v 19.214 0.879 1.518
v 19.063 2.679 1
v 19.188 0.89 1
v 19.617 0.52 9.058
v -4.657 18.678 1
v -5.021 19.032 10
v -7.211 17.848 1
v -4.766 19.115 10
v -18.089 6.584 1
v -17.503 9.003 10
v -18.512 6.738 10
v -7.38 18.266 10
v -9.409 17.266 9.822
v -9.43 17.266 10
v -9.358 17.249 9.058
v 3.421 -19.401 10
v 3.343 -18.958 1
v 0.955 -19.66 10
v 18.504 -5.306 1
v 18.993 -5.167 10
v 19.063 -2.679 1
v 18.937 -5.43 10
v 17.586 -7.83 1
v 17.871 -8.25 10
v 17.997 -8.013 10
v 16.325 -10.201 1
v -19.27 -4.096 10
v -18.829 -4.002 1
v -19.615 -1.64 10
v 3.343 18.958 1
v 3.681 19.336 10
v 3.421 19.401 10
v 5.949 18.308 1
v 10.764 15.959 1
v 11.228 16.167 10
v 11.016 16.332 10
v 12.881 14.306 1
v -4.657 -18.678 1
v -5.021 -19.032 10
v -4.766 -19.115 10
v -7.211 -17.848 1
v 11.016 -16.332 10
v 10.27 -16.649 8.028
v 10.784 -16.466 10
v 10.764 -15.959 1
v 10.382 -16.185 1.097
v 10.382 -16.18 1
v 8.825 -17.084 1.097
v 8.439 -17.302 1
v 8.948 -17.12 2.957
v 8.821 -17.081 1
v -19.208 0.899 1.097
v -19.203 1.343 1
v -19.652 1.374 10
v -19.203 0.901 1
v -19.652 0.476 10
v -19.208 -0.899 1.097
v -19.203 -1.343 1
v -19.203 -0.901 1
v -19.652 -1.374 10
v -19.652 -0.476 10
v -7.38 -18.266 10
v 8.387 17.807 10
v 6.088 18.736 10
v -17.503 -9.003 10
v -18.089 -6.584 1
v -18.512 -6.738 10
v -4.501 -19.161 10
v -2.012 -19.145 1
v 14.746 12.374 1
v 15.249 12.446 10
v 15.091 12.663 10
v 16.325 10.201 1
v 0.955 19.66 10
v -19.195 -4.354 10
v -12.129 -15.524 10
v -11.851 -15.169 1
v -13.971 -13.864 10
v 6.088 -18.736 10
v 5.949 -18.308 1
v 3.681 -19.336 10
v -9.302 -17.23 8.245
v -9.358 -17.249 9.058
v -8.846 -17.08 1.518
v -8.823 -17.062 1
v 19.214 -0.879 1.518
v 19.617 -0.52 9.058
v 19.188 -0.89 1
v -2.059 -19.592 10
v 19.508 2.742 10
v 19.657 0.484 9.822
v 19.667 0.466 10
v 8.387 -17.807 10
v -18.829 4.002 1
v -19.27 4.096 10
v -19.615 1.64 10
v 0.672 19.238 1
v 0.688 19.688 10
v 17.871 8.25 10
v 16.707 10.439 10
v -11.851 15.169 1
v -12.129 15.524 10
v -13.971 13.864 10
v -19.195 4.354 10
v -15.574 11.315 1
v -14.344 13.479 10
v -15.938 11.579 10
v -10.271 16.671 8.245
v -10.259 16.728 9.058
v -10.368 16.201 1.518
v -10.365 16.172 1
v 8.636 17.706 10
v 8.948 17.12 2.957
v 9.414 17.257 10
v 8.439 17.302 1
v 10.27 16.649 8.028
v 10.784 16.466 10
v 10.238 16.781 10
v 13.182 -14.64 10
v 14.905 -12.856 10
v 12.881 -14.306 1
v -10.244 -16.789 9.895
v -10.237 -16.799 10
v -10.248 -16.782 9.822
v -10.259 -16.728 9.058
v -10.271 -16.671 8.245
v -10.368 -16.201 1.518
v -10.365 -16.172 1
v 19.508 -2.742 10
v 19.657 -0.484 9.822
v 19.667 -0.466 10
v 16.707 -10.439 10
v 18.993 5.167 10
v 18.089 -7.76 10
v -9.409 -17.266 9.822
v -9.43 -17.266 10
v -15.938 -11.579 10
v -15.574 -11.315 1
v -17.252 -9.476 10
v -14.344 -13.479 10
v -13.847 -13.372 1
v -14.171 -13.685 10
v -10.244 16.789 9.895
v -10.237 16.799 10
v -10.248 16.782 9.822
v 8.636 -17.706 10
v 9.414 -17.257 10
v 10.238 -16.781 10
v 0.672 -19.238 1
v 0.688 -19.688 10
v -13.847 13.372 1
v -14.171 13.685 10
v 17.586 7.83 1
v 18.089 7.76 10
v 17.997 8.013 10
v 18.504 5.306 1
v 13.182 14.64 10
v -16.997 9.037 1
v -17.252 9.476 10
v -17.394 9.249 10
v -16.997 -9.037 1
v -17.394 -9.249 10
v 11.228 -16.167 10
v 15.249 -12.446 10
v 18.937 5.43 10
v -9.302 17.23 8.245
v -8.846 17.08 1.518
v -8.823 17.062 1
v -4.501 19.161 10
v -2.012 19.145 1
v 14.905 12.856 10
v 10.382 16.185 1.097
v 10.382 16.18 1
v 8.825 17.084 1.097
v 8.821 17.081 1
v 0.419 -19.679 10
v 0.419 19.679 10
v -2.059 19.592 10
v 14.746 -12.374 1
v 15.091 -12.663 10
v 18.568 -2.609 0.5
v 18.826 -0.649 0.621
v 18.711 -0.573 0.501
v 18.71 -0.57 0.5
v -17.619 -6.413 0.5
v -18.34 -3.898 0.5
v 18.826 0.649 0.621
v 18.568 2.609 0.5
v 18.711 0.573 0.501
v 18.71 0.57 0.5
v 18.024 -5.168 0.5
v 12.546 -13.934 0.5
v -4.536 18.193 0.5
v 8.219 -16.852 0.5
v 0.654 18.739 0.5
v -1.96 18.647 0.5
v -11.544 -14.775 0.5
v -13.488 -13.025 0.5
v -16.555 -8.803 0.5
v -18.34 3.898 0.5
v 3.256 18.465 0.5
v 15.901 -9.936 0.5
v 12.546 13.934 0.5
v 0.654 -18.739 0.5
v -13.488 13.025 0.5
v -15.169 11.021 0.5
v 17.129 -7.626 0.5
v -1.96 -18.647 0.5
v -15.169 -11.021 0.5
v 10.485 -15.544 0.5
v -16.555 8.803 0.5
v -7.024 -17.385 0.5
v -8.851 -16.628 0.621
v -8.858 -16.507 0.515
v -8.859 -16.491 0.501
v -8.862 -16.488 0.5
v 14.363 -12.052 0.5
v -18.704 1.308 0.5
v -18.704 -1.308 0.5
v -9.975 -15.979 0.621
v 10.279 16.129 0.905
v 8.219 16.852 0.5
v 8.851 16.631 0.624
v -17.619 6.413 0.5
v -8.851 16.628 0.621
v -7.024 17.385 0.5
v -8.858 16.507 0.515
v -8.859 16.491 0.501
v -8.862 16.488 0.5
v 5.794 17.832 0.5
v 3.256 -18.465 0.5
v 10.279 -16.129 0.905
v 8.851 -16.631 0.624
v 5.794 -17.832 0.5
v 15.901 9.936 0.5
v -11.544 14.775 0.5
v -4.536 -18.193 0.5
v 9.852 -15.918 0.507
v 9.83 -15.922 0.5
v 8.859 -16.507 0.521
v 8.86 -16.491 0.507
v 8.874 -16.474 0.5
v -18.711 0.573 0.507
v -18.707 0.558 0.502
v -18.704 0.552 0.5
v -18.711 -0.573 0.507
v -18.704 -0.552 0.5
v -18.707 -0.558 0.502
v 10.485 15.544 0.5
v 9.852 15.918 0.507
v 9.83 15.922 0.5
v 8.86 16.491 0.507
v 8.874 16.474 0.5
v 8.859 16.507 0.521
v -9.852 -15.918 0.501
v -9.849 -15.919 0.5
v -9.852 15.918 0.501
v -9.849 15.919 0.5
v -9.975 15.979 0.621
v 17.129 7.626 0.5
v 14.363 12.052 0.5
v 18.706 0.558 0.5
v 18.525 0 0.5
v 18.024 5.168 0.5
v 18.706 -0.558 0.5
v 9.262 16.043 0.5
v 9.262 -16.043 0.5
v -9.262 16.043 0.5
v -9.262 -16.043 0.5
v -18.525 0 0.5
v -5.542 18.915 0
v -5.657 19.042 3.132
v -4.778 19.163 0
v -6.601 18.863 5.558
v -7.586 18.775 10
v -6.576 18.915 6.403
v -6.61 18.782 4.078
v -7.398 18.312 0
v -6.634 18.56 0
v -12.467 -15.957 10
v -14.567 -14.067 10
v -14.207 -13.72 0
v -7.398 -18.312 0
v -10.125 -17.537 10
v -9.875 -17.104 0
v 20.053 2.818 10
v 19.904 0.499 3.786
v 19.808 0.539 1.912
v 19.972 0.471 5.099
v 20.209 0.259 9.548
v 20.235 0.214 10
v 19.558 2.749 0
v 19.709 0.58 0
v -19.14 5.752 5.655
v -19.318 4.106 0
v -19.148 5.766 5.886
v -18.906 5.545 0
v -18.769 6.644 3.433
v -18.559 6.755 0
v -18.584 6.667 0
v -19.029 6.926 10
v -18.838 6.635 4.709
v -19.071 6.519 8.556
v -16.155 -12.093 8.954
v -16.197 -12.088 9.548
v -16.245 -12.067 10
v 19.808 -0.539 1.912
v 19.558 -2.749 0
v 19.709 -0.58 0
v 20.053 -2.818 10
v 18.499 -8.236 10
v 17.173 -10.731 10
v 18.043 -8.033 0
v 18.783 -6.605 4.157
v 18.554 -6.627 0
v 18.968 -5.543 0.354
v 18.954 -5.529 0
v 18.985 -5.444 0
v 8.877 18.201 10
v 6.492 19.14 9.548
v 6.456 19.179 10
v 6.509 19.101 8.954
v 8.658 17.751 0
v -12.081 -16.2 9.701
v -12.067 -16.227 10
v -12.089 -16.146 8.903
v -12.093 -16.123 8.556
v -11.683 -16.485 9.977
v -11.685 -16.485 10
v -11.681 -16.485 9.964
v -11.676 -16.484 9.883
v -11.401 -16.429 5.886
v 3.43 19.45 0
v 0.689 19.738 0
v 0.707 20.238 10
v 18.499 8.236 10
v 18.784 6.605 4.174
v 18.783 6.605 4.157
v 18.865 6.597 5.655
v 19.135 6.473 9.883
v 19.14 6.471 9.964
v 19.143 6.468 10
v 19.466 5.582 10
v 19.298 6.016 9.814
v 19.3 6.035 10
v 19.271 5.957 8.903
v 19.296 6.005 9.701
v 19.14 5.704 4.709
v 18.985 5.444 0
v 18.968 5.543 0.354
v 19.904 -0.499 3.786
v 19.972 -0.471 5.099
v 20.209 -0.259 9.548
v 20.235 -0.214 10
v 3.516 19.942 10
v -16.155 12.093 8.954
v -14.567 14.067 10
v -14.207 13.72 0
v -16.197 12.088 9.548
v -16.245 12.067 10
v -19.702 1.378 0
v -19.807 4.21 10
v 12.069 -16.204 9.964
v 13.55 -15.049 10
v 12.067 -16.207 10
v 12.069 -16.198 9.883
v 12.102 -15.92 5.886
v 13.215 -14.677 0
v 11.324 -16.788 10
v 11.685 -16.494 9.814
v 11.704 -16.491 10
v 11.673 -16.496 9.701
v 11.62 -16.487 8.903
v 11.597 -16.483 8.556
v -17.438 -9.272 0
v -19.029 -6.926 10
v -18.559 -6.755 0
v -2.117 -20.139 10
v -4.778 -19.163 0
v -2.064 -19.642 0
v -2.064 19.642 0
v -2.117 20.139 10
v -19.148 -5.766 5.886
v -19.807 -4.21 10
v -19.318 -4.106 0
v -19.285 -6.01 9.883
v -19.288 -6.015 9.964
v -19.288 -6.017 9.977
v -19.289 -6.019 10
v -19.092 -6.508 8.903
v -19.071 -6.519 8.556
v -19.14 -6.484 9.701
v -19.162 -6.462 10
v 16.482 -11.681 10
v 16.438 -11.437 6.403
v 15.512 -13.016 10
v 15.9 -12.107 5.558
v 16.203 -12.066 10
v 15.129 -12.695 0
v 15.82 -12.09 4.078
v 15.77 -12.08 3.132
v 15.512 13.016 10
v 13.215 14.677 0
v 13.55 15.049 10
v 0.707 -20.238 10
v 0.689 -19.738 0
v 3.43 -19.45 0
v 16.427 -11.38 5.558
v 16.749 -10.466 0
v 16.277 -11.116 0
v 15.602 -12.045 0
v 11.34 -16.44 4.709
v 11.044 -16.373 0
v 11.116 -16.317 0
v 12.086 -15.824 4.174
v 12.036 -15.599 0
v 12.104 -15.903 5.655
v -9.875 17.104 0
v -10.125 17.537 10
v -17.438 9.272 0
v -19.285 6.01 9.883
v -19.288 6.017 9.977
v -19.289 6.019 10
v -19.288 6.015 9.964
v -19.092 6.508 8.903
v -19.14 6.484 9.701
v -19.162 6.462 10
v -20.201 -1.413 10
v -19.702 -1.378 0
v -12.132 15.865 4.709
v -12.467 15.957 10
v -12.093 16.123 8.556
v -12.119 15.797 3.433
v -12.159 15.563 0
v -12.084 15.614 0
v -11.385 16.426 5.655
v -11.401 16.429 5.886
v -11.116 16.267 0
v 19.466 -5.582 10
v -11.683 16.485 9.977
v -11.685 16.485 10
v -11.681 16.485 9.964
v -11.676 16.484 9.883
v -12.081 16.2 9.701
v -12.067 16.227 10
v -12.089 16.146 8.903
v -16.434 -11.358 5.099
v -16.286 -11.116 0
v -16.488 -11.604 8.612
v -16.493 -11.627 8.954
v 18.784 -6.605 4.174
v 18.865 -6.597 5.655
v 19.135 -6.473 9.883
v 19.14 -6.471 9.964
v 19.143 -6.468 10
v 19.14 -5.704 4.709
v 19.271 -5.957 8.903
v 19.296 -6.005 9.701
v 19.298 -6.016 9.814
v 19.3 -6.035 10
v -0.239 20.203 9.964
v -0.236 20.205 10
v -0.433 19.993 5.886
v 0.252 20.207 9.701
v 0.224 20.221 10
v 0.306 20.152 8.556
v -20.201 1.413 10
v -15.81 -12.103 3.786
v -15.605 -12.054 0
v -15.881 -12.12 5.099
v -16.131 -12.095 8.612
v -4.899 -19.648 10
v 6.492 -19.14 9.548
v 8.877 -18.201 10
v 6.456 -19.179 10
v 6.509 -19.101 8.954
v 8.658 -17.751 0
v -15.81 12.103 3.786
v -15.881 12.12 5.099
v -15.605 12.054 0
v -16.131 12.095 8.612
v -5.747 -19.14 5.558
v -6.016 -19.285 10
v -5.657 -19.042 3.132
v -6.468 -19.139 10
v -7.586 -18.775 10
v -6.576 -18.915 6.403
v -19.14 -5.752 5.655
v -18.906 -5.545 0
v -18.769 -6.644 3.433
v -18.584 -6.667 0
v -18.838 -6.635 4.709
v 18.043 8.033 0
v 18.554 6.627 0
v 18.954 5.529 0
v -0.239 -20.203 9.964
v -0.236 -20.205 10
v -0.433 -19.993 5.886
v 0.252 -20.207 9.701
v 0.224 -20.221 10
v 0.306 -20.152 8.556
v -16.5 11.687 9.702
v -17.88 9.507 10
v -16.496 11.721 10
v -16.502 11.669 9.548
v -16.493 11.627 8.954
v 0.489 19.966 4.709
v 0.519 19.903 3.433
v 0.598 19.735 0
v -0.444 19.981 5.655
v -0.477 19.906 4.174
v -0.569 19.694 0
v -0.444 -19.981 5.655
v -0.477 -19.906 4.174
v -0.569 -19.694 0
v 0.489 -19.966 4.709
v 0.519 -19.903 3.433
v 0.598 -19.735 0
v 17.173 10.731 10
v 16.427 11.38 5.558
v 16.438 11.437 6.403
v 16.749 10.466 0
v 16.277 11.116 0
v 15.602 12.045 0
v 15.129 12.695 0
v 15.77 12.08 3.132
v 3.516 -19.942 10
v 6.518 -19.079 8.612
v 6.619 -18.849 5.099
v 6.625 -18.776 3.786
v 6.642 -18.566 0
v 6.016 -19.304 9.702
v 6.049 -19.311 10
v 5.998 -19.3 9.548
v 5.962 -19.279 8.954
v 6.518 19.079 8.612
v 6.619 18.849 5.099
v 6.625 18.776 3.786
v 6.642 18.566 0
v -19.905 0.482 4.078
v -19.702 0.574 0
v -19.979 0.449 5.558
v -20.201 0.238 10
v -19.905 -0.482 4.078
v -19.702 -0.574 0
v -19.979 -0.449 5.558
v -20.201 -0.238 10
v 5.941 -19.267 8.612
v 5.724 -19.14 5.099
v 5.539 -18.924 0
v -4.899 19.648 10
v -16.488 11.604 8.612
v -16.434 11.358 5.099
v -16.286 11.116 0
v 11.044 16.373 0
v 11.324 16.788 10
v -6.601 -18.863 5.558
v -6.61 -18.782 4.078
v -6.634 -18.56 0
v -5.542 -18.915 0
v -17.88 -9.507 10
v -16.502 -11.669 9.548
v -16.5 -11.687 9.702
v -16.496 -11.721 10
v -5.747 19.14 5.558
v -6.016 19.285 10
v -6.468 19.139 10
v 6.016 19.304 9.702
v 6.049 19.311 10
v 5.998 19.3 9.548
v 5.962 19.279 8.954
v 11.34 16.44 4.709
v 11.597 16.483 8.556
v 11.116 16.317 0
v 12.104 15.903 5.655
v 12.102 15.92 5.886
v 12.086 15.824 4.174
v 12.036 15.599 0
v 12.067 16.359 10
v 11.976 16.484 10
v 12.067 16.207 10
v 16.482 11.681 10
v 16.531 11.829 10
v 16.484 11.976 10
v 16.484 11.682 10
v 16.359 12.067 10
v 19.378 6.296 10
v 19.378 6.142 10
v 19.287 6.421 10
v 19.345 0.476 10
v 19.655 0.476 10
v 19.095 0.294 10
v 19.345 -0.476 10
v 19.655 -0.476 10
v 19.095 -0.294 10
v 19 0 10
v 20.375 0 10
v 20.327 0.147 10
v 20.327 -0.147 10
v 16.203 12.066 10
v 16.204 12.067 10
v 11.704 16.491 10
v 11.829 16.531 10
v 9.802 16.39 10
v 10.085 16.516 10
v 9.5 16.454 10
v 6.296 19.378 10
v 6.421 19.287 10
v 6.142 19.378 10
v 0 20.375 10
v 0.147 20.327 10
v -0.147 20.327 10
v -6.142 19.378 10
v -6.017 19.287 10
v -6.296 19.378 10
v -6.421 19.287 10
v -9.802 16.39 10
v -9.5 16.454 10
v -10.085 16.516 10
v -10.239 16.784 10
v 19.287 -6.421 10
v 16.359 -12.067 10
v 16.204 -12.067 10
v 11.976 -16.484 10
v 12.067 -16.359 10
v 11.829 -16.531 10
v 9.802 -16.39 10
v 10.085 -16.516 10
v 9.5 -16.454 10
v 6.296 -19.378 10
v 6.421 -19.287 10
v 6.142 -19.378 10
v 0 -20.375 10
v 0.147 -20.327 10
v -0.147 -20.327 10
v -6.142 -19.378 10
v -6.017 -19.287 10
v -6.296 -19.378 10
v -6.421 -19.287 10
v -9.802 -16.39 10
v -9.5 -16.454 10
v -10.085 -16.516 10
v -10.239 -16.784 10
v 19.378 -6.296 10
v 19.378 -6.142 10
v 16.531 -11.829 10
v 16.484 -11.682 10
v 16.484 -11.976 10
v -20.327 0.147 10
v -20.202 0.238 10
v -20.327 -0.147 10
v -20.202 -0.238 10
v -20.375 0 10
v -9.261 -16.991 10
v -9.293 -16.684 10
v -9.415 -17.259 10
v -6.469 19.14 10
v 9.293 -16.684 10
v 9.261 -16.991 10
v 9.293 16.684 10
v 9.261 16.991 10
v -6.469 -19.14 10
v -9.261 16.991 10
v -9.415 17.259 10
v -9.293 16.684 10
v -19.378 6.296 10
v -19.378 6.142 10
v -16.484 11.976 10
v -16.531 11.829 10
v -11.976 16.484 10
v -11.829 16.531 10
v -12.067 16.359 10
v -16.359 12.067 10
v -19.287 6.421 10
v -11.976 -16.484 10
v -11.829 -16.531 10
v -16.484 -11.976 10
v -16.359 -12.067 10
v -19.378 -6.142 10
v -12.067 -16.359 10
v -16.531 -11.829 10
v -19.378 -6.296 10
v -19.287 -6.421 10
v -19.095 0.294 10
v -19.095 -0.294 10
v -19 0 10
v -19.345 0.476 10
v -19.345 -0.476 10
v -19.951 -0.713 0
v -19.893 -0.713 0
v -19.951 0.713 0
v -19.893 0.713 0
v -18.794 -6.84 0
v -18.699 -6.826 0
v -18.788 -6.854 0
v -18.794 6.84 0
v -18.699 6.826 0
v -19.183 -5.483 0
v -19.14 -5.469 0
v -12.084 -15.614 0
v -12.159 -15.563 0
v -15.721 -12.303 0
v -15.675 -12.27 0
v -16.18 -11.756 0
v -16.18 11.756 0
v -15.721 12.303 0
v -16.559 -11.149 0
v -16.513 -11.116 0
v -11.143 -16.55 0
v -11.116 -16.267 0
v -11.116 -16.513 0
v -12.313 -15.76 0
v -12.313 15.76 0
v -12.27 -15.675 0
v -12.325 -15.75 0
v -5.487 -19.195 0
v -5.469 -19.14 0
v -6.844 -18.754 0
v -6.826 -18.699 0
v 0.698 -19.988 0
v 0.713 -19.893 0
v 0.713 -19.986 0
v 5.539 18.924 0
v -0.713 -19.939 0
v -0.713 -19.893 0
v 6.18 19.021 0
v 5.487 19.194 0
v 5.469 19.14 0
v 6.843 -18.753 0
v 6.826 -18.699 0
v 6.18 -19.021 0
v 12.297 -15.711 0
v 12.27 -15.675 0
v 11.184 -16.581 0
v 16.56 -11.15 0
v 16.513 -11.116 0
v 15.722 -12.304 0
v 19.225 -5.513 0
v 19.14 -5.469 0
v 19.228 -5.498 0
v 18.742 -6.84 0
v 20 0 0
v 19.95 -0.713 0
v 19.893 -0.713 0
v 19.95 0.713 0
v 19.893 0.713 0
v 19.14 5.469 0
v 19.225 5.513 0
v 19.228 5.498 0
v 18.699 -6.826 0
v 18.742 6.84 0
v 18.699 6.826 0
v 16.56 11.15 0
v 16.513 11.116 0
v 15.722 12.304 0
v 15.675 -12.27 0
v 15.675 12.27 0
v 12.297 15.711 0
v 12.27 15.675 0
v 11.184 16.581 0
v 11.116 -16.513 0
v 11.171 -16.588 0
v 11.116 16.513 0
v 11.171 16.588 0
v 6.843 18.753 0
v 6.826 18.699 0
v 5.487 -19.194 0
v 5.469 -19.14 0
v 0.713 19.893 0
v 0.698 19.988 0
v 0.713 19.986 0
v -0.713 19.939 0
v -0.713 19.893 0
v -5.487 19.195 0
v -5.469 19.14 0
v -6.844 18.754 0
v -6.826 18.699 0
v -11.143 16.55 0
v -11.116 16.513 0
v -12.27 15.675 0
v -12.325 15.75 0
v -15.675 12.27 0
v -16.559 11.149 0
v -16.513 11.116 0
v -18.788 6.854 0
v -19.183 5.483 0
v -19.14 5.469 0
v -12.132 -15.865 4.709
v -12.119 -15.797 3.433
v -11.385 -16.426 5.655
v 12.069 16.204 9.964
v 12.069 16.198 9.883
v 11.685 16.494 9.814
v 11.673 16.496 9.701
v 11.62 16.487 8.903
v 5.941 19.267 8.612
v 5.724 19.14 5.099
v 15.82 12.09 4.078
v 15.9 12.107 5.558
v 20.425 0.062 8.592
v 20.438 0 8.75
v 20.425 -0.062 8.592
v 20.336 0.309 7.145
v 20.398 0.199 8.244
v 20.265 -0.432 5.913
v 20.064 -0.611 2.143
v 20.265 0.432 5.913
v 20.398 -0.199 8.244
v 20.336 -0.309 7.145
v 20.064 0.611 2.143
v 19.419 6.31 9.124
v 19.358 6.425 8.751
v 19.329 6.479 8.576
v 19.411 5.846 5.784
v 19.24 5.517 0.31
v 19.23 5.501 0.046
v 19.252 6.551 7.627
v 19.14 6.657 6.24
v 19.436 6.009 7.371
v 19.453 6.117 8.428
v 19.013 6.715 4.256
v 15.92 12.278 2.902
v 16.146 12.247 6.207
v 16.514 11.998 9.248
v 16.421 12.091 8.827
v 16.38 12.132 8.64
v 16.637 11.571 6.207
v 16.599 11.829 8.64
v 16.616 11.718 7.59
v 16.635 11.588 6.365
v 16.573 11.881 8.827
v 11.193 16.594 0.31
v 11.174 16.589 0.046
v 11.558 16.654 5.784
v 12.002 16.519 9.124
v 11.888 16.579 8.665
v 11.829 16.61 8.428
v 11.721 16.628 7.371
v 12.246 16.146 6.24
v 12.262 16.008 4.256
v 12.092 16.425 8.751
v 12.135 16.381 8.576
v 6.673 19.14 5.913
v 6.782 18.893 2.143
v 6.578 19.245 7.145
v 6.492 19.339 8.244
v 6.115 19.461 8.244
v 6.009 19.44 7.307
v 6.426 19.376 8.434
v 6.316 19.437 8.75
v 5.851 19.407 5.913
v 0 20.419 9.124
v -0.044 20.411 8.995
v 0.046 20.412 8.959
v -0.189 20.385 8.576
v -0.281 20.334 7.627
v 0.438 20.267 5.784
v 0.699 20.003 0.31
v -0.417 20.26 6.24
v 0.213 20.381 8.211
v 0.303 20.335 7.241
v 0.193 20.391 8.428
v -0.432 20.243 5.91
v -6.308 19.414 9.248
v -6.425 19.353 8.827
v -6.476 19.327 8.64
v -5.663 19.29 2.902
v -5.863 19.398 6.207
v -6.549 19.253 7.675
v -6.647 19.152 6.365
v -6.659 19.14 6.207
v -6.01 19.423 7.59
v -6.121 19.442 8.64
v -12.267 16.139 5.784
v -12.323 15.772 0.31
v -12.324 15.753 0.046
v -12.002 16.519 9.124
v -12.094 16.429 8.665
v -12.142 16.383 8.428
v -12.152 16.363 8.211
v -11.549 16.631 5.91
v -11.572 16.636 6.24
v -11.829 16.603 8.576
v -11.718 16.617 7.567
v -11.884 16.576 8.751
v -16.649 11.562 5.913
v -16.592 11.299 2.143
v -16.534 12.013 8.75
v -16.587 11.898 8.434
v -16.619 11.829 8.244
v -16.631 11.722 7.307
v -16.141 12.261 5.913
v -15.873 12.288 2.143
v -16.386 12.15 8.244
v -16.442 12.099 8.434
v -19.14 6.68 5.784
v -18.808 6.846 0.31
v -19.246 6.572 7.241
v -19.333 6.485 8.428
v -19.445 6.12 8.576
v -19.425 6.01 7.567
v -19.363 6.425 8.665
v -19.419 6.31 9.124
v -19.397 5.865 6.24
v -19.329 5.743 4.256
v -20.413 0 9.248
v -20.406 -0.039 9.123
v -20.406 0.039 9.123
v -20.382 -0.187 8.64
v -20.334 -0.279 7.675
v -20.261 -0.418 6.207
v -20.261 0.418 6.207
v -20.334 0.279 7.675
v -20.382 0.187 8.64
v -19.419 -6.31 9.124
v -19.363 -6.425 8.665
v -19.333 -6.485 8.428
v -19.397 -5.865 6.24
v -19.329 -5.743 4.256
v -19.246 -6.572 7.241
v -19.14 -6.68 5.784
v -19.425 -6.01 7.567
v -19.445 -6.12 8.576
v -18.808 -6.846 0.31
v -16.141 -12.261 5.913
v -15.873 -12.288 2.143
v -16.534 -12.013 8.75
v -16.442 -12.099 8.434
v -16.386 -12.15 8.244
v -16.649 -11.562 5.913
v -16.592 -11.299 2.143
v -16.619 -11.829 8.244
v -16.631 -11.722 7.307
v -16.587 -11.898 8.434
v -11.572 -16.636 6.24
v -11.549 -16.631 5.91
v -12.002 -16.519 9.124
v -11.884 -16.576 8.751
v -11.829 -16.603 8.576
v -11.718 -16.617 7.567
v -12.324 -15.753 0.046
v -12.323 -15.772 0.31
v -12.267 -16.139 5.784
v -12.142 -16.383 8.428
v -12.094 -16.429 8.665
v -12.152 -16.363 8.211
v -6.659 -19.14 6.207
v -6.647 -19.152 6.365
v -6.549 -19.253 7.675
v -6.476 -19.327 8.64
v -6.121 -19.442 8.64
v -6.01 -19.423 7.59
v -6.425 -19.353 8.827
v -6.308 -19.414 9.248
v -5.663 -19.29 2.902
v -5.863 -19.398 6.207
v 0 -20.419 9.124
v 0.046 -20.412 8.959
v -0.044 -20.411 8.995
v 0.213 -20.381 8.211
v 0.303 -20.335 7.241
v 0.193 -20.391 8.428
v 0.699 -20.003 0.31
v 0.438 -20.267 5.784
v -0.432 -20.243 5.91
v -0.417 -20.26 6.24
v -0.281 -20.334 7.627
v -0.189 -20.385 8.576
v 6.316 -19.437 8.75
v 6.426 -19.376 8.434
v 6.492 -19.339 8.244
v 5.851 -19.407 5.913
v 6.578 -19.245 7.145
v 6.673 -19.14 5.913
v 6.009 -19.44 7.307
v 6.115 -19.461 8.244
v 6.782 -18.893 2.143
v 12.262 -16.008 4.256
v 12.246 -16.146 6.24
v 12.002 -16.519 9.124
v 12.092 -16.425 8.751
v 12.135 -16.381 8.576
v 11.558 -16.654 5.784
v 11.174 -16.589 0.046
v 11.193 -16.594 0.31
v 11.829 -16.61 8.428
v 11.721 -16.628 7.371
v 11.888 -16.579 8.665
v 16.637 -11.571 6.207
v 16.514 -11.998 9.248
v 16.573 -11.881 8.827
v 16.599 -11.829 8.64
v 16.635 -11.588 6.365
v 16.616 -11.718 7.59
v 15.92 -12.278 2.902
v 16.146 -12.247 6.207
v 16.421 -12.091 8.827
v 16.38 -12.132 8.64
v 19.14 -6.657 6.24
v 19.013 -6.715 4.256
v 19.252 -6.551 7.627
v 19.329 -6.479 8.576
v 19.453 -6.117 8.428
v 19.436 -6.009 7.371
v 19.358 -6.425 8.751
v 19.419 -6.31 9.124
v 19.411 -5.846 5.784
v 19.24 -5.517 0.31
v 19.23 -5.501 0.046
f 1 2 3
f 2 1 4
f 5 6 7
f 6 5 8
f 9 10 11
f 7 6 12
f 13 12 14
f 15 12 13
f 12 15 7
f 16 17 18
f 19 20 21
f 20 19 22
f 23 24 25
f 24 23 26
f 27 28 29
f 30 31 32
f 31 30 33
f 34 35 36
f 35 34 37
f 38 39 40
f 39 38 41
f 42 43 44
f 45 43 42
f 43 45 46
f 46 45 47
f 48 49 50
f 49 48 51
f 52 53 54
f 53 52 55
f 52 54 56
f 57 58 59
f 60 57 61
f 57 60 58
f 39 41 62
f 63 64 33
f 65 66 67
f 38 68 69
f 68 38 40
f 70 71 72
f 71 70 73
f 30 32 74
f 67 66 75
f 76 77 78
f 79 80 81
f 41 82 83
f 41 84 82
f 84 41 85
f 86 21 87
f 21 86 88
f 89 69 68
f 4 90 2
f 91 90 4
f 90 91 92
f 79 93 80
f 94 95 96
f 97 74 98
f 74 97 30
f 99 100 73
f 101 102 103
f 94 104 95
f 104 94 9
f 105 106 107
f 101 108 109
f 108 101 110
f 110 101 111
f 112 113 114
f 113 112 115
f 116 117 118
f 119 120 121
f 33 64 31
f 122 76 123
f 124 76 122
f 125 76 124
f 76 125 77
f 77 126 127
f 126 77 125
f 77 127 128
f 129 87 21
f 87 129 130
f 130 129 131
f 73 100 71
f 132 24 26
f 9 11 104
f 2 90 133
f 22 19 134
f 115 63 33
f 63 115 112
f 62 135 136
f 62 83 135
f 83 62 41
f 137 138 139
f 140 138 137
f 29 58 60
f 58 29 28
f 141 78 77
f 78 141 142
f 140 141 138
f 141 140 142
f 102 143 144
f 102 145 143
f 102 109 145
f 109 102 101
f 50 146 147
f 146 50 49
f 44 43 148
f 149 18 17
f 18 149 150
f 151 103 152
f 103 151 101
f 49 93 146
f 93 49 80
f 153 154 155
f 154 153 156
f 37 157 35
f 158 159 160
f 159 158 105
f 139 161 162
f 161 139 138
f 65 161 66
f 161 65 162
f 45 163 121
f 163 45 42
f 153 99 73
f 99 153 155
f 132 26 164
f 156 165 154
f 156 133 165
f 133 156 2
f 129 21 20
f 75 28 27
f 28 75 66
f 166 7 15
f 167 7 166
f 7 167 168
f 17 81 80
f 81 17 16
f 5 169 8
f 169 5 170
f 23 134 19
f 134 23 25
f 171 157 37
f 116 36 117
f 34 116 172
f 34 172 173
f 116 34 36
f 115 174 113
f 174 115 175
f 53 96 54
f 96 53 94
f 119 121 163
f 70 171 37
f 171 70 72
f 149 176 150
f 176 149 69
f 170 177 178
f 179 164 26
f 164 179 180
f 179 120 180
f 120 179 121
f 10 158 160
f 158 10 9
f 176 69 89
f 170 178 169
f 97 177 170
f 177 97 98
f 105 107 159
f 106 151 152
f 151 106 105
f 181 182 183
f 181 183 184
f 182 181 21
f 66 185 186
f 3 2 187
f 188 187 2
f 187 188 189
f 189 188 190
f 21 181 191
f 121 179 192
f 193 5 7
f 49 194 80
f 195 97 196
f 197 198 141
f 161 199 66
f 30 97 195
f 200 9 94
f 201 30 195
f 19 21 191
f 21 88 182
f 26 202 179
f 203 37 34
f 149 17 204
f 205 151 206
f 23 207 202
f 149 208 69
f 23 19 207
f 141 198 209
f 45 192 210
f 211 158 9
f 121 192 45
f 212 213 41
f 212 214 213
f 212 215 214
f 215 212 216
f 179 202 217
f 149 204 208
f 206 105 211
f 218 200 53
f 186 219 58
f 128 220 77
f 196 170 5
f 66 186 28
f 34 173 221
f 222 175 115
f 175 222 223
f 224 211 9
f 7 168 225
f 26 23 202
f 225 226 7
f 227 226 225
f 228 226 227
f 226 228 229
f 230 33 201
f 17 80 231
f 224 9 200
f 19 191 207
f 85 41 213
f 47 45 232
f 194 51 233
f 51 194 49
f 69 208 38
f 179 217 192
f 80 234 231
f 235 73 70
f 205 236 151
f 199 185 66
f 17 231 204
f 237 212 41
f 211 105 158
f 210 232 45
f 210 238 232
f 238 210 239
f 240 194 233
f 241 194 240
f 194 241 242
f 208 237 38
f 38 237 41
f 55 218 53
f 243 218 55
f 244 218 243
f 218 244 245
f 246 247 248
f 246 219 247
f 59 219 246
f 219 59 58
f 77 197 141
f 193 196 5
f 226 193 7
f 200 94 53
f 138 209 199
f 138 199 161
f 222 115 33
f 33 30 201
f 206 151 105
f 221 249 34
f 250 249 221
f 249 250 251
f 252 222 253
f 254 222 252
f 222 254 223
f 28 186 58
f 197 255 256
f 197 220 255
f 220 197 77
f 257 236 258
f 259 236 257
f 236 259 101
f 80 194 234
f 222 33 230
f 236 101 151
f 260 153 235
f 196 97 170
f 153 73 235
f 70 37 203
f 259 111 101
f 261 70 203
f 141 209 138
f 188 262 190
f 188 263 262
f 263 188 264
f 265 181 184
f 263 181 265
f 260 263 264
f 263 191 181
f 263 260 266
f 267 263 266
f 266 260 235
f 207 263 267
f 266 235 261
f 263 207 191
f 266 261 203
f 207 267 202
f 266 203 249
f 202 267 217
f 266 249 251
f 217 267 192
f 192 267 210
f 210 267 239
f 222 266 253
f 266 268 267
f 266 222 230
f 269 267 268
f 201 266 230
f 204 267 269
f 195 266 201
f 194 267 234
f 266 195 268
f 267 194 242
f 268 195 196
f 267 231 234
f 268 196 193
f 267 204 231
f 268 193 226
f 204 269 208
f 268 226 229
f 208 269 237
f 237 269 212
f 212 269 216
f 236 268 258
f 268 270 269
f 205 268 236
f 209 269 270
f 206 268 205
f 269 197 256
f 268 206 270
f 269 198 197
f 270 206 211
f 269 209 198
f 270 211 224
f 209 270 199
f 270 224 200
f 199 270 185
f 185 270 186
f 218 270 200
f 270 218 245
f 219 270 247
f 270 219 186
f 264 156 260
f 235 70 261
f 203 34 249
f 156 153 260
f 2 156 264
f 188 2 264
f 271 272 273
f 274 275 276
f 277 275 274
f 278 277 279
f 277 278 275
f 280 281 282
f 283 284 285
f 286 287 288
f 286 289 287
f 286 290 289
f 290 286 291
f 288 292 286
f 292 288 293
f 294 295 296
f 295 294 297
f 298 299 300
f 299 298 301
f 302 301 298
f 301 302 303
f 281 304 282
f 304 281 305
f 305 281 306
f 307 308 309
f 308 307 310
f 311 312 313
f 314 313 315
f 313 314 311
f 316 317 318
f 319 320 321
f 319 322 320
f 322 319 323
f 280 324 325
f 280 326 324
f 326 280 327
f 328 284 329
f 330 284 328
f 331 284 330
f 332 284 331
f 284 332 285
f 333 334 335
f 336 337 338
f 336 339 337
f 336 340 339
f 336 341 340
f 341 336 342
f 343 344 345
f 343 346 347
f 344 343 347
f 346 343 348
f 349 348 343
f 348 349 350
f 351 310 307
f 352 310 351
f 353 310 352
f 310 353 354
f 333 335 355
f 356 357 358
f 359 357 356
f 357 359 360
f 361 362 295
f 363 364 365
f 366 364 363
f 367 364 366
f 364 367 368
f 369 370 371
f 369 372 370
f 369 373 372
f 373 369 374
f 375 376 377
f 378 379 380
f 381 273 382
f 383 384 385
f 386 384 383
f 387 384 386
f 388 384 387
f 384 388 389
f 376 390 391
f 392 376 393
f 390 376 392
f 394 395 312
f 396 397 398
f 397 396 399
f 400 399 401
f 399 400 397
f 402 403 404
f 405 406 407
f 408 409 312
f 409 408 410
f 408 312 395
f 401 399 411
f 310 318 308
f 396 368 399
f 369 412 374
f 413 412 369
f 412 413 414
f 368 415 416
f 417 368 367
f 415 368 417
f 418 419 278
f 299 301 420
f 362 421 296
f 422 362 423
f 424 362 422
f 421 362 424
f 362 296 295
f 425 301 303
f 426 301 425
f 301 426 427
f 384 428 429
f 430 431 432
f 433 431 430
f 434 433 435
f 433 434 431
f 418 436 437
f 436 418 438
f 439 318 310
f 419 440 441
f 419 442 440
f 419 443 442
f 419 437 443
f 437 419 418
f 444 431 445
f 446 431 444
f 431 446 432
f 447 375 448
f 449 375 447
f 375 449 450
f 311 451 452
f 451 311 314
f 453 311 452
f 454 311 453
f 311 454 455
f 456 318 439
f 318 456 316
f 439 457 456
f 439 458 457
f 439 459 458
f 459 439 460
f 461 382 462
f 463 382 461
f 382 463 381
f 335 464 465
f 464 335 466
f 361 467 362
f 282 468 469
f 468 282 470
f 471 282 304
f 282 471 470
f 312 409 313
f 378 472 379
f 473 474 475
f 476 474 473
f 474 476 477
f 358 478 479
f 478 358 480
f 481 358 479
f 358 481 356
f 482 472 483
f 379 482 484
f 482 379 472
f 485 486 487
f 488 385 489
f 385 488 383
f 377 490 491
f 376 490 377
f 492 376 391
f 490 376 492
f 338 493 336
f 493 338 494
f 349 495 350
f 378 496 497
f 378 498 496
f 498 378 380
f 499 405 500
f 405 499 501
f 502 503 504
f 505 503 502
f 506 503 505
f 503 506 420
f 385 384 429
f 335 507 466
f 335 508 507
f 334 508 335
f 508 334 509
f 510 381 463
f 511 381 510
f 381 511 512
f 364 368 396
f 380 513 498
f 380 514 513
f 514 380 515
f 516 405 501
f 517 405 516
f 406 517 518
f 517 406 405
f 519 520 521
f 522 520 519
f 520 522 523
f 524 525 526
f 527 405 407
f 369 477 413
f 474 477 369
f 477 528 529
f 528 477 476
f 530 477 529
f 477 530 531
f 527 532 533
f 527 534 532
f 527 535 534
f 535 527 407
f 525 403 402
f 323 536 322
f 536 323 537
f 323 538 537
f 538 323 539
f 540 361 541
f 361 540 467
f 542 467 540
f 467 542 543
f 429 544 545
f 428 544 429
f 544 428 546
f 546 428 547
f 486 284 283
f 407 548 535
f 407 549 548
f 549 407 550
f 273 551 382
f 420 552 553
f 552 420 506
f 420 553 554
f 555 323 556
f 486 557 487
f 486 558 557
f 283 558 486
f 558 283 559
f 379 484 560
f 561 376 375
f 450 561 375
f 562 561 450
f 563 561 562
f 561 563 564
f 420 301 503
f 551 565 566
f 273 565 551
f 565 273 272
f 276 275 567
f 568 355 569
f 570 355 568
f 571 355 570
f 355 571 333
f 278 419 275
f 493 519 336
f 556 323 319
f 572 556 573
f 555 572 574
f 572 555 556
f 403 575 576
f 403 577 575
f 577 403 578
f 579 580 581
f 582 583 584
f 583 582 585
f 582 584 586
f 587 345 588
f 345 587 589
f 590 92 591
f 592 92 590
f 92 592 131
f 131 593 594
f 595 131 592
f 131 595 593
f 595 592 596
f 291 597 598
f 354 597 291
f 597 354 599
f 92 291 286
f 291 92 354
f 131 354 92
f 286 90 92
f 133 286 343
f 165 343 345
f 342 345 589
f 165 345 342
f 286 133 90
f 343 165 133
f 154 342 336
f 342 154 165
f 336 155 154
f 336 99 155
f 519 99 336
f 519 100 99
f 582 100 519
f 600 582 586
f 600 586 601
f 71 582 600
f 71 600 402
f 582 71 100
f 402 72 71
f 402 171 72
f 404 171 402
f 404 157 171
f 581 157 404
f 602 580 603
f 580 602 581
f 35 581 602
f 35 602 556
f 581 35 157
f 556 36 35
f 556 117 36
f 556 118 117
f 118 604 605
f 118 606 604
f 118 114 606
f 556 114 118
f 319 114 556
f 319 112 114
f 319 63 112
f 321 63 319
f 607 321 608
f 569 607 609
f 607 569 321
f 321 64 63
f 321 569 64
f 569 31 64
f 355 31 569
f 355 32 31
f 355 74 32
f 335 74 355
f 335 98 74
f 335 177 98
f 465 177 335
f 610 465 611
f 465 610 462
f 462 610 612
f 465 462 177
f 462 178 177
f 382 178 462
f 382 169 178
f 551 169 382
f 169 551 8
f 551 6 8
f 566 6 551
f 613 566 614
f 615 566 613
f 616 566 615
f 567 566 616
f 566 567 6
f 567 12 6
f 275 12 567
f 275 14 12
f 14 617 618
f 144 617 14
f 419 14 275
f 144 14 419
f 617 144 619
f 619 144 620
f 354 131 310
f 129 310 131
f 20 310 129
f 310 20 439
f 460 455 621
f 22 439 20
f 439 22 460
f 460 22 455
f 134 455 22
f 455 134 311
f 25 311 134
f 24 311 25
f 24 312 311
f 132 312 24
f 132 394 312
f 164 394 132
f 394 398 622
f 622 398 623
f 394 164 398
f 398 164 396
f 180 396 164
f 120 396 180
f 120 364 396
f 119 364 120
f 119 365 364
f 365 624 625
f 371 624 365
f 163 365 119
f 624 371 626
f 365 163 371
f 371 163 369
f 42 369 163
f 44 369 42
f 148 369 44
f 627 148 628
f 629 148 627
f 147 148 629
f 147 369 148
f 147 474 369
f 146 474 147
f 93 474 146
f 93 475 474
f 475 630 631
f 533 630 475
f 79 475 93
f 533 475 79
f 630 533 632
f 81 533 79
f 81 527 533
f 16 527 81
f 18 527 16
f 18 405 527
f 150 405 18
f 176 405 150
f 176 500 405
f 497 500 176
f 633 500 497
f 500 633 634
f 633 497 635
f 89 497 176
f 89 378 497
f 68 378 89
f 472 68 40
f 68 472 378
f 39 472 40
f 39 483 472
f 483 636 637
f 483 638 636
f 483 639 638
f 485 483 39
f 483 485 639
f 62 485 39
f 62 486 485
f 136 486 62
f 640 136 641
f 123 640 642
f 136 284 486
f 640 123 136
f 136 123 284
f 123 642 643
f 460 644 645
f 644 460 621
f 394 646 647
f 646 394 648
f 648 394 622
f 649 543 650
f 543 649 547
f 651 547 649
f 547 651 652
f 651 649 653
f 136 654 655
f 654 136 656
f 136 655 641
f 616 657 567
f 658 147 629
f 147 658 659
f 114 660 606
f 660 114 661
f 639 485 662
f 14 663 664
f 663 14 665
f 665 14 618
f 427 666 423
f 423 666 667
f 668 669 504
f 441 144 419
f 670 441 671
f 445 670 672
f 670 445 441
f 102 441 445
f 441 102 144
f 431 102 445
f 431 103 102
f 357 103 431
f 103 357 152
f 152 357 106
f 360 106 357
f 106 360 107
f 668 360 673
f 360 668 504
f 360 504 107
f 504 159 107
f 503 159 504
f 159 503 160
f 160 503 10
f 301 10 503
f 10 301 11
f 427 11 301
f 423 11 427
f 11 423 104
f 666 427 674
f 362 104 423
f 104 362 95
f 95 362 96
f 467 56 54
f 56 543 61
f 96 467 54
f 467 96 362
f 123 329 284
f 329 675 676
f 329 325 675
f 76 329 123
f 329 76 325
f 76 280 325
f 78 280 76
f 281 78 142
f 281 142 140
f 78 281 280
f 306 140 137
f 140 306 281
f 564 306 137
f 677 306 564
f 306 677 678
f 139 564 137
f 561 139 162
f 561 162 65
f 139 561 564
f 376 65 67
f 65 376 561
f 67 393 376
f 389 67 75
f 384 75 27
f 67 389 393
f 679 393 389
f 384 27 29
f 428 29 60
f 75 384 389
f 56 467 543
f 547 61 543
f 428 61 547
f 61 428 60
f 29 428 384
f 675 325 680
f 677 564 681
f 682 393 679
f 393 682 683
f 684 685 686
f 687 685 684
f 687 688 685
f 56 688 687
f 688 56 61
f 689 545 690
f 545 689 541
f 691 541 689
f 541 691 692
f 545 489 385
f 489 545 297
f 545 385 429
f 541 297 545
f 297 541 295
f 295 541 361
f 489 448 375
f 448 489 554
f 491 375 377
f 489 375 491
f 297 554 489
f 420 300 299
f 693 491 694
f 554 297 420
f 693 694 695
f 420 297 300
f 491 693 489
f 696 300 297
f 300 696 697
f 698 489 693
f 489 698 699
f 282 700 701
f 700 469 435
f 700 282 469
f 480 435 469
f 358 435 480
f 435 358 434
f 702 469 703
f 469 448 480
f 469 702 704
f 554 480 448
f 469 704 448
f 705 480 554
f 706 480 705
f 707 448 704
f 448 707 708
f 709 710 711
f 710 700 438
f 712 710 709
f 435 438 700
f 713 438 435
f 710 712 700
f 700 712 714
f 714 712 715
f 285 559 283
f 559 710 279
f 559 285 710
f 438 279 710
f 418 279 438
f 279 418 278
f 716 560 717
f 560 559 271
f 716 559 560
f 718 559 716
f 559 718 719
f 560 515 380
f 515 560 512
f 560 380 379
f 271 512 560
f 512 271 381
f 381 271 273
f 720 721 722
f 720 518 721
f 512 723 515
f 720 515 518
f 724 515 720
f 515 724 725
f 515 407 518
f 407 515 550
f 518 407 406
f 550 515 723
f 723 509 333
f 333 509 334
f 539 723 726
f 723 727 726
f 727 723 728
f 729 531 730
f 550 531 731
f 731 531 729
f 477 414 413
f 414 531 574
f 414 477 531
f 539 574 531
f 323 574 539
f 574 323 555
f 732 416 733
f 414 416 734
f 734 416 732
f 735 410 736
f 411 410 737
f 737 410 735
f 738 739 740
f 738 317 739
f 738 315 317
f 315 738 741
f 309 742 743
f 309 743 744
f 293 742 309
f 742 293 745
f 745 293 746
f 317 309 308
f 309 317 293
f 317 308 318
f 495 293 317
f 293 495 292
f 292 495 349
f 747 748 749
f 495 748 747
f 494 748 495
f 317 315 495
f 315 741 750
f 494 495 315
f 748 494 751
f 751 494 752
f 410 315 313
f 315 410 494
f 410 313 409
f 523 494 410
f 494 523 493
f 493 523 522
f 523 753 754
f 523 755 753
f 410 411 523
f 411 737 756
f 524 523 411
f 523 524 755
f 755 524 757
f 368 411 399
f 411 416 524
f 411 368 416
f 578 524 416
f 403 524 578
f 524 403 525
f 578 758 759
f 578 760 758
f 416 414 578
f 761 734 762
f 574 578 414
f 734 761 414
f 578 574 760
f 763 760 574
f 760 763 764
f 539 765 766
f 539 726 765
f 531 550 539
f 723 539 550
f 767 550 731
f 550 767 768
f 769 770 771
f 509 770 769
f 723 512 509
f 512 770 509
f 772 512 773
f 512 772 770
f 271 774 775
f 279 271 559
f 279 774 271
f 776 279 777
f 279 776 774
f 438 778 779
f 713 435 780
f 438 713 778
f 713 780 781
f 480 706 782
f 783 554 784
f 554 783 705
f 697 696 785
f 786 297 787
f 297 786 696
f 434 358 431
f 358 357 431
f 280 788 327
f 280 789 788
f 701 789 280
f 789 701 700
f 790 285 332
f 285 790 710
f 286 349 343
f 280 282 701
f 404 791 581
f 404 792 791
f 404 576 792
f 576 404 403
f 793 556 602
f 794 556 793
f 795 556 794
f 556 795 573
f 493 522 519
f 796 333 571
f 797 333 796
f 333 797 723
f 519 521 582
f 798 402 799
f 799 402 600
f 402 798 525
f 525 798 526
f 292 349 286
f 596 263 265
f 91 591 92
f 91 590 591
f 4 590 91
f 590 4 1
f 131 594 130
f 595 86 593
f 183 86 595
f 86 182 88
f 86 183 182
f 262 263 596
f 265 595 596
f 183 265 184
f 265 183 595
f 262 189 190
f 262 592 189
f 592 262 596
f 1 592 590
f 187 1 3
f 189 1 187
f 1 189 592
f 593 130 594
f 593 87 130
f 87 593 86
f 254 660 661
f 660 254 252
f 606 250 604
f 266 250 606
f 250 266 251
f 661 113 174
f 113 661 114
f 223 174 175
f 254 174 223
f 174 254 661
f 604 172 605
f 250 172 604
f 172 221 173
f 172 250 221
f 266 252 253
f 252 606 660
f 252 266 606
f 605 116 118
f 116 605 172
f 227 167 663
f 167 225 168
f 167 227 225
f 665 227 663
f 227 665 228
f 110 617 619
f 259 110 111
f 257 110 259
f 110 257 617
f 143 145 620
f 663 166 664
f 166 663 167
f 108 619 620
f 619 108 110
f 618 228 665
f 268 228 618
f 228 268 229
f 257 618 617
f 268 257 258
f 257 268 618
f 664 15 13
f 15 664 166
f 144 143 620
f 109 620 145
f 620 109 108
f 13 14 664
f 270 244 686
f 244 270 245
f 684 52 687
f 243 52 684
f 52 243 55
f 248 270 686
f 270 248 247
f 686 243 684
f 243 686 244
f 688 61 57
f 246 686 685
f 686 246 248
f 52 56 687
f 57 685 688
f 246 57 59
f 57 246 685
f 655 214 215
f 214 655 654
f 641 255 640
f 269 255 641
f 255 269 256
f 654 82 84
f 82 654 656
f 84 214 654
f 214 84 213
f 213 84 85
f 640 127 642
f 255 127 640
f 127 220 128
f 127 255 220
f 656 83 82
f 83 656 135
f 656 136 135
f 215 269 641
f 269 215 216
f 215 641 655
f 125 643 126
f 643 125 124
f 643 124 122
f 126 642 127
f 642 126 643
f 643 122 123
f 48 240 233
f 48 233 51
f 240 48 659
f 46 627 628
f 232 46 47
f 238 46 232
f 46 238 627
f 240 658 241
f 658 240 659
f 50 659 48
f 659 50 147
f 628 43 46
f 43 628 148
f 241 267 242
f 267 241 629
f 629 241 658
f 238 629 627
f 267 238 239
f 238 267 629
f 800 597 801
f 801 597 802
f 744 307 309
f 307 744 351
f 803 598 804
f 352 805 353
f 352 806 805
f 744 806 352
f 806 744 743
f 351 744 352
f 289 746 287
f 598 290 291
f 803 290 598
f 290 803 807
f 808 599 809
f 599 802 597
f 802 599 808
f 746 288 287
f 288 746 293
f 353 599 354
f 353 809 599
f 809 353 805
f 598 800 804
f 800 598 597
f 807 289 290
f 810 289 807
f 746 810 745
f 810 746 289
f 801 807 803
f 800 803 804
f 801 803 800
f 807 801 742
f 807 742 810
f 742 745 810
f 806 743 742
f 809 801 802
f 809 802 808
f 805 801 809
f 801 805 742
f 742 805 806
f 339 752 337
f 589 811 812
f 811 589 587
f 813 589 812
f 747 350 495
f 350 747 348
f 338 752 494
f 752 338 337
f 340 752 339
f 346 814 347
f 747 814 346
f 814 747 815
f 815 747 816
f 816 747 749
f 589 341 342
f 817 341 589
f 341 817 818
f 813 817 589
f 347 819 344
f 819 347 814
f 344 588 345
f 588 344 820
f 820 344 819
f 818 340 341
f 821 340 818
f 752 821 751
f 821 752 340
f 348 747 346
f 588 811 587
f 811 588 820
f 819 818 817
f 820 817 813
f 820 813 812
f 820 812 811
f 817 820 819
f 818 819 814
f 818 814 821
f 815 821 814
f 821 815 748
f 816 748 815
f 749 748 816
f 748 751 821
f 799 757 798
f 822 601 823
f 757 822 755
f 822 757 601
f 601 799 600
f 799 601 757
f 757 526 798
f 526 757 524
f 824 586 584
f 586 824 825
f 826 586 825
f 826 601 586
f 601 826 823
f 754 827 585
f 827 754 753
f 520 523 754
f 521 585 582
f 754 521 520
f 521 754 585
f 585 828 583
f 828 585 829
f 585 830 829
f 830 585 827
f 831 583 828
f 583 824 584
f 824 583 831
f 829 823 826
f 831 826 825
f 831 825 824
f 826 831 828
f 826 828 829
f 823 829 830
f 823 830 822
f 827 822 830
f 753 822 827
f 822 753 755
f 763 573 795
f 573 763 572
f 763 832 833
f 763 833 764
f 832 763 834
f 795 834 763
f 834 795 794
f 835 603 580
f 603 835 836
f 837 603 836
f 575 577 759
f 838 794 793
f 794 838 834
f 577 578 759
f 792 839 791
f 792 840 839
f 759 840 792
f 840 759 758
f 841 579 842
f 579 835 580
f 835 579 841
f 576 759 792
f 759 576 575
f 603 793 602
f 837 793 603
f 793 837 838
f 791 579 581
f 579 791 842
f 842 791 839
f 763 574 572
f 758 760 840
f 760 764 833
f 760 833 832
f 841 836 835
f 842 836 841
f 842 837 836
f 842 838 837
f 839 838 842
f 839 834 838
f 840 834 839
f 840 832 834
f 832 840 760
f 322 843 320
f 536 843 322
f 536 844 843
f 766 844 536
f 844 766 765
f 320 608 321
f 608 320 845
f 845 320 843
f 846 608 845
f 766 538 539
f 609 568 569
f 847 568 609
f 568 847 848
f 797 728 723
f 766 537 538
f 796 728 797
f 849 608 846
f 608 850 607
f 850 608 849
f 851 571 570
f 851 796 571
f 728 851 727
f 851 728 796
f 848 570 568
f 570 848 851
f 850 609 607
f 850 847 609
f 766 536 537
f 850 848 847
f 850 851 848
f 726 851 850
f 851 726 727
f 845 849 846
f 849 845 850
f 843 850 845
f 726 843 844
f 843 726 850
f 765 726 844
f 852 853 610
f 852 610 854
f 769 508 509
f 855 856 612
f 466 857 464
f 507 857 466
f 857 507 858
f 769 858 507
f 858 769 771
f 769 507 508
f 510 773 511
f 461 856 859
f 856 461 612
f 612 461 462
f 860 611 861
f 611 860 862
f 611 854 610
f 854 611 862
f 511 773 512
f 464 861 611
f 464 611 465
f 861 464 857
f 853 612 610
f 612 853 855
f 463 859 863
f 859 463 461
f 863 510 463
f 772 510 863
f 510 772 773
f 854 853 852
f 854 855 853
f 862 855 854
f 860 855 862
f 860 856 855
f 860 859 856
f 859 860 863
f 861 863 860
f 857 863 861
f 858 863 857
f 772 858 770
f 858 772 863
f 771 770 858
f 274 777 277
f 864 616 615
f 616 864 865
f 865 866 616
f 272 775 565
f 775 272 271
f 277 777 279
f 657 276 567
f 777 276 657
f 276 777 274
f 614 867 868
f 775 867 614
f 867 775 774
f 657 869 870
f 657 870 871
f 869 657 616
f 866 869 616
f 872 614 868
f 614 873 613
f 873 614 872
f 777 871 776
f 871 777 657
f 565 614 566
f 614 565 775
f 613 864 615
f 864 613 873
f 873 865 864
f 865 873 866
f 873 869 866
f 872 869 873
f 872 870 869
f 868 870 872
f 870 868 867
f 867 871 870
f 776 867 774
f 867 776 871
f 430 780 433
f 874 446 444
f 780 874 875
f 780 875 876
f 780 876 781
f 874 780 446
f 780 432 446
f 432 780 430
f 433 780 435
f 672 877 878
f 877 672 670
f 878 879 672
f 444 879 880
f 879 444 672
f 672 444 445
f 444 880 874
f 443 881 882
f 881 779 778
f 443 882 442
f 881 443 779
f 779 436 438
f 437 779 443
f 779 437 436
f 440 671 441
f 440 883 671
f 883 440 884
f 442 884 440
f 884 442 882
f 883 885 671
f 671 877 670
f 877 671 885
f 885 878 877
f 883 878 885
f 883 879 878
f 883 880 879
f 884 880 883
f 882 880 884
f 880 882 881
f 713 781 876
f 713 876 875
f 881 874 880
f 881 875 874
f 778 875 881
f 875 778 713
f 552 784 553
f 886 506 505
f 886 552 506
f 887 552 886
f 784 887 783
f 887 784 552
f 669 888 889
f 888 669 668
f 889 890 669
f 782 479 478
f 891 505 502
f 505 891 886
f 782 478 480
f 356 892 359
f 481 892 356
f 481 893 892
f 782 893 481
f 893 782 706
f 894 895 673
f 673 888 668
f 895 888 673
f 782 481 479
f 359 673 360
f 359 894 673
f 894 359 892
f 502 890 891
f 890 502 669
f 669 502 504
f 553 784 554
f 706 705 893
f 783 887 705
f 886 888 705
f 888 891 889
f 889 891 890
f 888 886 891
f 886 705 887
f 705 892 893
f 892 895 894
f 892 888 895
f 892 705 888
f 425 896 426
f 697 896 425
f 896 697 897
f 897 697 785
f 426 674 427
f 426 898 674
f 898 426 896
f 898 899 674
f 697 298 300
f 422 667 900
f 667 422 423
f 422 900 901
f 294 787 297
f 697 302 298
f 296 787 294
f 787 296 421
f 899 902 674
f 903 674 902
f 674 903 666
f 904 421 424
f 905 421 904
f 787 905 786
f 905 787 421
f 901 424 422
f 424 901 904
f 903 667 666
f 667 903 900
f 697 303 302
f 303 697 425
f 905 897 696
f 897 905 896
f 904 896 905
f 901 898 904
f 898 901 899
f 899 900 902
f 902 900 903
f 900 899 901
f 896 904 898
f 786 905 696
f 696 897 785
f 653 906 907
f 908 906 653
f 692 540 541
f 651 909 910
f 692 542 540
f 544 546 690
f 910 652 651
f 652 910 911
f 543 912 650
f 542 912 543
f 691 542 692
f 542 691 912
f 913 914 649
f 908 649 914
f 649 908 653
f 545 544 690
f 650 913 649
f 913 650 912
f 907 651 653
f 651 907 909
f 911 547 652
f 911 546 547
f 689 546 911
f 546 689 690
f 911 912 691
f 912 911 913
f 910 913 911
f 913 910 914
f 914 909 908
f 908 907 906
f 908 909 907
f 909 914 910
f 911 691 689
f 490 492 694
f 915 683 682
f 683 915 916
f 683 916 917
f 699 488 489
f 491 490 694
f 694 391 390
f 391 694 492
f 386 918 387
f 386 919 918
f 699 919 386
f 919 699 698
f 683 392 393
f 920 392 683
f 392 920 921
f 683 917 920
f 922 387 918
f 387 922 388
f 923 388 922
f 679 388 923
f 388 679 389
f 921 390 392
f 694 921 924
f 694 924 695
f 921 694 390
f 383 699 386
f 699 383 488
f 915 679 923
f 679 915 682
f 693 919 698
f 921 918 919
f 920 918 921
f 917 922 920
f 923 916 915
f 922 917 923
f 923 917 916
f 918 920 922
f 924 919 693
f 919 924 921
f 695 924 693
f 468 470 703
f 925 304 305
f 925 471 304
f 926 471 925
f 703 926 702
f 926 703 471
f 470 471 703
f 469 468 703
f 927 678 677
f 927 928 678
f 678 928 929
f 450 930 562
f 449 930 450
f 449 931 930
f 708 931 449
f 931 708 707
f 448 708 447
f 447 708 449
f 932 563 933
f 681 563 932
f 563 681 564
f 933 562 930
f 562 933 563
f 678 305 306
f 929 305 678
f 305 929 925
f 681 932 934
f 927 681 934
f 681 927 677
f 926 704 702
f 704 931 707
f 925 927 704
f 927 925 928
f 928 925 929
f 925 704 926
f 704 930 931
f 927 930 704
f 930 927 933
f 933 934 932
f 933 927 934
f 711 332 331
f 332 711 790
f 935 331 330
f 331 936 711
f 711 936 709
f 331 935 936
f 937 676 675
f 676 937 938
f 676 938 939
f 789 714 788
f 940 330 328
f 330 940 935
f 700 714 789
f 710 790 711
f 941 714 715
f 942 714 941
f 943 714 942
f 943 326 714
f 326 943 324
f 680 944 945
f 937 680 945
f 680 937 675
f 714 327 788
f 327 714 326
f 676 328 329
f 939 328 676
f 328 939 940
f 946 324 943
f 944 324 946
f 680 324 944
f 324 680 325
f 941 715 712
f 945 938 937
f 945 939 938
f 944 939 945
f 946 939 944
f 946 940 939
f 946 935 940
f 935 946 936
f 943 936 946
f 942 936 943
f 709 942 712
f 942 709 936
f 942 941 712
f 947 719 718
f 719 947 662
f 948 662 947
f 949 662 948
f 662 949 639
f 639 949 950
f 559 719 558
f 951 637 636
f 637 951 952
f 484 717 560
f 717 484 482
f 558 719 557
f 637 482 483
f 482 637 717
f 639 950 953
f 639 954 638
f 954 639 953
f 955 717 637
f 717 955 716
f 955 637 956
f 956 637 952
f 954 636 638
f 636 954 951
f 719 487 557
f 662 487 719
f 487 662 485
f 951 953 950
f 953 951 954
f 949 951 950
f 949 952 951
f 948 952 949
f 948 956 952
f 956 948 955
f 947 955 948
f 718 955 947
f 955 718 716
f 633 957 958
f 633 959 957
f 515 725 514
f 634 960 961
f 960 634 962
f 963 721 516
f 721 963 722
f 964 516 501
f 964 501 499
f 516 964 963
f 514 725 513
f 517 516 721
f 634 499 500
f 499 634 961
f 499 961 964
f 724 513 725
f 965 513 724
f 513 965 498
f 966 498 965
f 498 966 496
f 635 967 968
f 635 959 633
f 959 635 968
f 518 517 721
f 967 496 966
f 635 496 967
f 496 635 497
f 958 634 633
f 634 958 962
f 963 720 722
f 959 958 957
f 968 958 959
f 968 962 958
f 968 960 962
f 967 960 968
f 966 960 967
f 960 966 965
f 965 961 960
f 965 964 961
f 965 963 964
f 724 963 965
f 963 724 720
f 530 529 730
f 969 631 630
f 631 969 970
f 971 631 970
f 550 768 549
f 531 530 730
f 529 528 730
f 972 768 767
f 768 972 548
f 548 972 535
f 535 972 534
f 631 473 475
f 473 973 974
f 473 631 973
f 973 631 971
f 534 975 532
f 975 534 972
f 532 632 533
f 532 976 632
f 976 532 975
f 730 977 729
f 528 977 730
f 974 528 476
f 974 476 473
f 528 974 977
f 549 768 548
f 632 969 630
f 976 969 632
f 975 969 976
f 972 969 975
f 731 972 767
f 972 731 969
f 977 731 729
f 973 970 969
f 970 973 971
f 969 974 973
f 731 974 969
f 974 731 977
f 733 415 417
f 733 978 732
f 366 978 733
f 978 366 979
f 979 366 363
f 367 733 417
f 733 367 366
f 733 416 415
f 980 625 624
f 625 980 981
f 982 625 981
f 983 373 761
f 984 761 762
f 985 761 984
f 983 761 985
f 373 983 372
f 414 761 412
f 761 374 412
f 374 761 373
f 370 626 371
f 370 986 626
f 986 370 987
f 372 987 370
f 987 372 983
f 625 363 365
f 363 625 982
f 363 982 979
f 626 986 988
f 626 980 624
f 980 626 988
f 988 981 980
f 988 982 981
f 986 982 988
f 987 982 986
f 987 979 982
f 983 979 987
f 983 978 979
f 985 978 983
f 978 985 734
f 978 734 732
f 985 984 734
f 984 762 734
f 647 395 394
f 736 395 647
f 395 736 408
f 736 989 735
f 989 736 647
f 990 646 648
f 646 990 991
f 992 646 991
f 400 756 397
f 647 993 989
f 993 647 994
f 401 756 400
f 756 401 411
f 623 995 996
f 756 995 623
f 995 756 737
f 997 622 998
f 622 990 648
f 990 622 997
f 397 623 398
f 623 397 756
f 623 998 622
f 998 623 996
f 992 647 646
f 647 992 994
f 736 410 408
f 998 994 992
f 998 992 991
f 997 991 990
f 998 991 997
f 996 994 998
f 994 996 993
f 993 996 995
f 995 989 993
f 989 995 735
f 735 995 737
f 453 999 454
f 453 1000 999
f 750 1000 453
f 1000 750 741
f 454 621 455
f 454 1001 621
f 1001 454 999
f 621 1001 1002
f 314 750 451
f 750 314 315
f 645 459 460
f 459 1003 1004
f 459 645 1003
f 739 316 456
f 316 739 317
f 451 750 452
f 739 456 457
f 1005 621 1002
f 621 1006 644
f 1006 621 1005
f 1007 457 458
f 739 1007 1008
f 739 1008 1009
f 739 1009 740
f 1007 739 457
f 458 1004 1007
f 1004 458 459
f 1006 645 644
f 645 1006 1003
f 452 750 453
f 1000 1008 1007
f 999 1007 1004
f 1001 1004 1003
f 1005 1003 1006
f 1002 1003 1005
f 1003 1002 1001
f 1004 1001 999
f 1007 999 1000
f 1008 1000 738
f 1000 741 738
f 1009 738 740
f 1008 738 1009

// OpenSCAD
// the circle is approximated by this number of lines.  A 45-agon is pretty close to a circle.
$fn = 45;
// Diameter of the eyepiece in mm
innerDiameter = 38.5; 
innerRadius = innerDiameter/2;

// Diameter of the lenscap on the outside in mm
outerDiameter = 39.5; 
outerRadius = outerDiameter/2;

// thickness of the flat disk of the lenscap
pancakeThickness = 0.5;

// height of the lenscap
height = 10;

// size of inner ridges in mm.
ridgeSize = 0.5;

// size of ridges on the outside, in mm.
OuterRidgeSize = 0.25;

// number of ridges on the inside of the cap
ridges = 6;

//number of ridges out the outside of the cap
outerRidges = 20;

// how much bigger the far end of the cap is, so it gets tighter as you push farther
taper = 0.5;


module cap()
{
union(){
    difference(){ 
        {cylinder(h=height, r1=outerRadius, r2=outerRadius + taper );};  
        union(){ 
            translate([0,0,pancakeThickness*2]){cylinder(h=height         
                            , r1=innerRadius, r2=innerRadius + taper);};
            // a small transition strip from the horizontal to the vertical.
            translate([0,0,pancakeThickness]){cylinder(h=pancakeThickness         
                , r1=innerRadius -pancakeThickness , r2=innerRadius);};
        };
    };
    ridges();
}   
}

module ridges()
{
    if (ridges > 0)
    {
        step = 360/ridges;
        for( i=[0:ridges])
        {
            intersection()
            {
                rotate(a=i*step){
                translate([innerRadius-ridgeSize/2  + taper , 0,0])
                    cylinder(h=height, r1=ridgeSize + taper , 
                        r2=ridgeSize, $fn = 10); 
                };
                cylinder(h=height , r1=innerRadius, 
                    r2=innerRadius + taper);
            }
        };
    }   
    if (outerRidges > 0)
    {
        outerStep = 360/outerRidges;
        for( i=[0:outerRidges])
        {
            intersection()
            {
                rotate(a=i*outerStep){
                translate([outerRadius-OuterRidgeSize/2  + taper , 0,0])
                cylinder(h=height, r1=OuterRidgeSize  + taper , 
                    r2=OuterRidgeSize , $fn = 10 );
                };
                cylinder(h=height , r1=outerRadius + OuterRidgeSize, 
                    r2=outerRadius + OuterRidgeSize + taper);
            }        
        };
    }
}

cap();
